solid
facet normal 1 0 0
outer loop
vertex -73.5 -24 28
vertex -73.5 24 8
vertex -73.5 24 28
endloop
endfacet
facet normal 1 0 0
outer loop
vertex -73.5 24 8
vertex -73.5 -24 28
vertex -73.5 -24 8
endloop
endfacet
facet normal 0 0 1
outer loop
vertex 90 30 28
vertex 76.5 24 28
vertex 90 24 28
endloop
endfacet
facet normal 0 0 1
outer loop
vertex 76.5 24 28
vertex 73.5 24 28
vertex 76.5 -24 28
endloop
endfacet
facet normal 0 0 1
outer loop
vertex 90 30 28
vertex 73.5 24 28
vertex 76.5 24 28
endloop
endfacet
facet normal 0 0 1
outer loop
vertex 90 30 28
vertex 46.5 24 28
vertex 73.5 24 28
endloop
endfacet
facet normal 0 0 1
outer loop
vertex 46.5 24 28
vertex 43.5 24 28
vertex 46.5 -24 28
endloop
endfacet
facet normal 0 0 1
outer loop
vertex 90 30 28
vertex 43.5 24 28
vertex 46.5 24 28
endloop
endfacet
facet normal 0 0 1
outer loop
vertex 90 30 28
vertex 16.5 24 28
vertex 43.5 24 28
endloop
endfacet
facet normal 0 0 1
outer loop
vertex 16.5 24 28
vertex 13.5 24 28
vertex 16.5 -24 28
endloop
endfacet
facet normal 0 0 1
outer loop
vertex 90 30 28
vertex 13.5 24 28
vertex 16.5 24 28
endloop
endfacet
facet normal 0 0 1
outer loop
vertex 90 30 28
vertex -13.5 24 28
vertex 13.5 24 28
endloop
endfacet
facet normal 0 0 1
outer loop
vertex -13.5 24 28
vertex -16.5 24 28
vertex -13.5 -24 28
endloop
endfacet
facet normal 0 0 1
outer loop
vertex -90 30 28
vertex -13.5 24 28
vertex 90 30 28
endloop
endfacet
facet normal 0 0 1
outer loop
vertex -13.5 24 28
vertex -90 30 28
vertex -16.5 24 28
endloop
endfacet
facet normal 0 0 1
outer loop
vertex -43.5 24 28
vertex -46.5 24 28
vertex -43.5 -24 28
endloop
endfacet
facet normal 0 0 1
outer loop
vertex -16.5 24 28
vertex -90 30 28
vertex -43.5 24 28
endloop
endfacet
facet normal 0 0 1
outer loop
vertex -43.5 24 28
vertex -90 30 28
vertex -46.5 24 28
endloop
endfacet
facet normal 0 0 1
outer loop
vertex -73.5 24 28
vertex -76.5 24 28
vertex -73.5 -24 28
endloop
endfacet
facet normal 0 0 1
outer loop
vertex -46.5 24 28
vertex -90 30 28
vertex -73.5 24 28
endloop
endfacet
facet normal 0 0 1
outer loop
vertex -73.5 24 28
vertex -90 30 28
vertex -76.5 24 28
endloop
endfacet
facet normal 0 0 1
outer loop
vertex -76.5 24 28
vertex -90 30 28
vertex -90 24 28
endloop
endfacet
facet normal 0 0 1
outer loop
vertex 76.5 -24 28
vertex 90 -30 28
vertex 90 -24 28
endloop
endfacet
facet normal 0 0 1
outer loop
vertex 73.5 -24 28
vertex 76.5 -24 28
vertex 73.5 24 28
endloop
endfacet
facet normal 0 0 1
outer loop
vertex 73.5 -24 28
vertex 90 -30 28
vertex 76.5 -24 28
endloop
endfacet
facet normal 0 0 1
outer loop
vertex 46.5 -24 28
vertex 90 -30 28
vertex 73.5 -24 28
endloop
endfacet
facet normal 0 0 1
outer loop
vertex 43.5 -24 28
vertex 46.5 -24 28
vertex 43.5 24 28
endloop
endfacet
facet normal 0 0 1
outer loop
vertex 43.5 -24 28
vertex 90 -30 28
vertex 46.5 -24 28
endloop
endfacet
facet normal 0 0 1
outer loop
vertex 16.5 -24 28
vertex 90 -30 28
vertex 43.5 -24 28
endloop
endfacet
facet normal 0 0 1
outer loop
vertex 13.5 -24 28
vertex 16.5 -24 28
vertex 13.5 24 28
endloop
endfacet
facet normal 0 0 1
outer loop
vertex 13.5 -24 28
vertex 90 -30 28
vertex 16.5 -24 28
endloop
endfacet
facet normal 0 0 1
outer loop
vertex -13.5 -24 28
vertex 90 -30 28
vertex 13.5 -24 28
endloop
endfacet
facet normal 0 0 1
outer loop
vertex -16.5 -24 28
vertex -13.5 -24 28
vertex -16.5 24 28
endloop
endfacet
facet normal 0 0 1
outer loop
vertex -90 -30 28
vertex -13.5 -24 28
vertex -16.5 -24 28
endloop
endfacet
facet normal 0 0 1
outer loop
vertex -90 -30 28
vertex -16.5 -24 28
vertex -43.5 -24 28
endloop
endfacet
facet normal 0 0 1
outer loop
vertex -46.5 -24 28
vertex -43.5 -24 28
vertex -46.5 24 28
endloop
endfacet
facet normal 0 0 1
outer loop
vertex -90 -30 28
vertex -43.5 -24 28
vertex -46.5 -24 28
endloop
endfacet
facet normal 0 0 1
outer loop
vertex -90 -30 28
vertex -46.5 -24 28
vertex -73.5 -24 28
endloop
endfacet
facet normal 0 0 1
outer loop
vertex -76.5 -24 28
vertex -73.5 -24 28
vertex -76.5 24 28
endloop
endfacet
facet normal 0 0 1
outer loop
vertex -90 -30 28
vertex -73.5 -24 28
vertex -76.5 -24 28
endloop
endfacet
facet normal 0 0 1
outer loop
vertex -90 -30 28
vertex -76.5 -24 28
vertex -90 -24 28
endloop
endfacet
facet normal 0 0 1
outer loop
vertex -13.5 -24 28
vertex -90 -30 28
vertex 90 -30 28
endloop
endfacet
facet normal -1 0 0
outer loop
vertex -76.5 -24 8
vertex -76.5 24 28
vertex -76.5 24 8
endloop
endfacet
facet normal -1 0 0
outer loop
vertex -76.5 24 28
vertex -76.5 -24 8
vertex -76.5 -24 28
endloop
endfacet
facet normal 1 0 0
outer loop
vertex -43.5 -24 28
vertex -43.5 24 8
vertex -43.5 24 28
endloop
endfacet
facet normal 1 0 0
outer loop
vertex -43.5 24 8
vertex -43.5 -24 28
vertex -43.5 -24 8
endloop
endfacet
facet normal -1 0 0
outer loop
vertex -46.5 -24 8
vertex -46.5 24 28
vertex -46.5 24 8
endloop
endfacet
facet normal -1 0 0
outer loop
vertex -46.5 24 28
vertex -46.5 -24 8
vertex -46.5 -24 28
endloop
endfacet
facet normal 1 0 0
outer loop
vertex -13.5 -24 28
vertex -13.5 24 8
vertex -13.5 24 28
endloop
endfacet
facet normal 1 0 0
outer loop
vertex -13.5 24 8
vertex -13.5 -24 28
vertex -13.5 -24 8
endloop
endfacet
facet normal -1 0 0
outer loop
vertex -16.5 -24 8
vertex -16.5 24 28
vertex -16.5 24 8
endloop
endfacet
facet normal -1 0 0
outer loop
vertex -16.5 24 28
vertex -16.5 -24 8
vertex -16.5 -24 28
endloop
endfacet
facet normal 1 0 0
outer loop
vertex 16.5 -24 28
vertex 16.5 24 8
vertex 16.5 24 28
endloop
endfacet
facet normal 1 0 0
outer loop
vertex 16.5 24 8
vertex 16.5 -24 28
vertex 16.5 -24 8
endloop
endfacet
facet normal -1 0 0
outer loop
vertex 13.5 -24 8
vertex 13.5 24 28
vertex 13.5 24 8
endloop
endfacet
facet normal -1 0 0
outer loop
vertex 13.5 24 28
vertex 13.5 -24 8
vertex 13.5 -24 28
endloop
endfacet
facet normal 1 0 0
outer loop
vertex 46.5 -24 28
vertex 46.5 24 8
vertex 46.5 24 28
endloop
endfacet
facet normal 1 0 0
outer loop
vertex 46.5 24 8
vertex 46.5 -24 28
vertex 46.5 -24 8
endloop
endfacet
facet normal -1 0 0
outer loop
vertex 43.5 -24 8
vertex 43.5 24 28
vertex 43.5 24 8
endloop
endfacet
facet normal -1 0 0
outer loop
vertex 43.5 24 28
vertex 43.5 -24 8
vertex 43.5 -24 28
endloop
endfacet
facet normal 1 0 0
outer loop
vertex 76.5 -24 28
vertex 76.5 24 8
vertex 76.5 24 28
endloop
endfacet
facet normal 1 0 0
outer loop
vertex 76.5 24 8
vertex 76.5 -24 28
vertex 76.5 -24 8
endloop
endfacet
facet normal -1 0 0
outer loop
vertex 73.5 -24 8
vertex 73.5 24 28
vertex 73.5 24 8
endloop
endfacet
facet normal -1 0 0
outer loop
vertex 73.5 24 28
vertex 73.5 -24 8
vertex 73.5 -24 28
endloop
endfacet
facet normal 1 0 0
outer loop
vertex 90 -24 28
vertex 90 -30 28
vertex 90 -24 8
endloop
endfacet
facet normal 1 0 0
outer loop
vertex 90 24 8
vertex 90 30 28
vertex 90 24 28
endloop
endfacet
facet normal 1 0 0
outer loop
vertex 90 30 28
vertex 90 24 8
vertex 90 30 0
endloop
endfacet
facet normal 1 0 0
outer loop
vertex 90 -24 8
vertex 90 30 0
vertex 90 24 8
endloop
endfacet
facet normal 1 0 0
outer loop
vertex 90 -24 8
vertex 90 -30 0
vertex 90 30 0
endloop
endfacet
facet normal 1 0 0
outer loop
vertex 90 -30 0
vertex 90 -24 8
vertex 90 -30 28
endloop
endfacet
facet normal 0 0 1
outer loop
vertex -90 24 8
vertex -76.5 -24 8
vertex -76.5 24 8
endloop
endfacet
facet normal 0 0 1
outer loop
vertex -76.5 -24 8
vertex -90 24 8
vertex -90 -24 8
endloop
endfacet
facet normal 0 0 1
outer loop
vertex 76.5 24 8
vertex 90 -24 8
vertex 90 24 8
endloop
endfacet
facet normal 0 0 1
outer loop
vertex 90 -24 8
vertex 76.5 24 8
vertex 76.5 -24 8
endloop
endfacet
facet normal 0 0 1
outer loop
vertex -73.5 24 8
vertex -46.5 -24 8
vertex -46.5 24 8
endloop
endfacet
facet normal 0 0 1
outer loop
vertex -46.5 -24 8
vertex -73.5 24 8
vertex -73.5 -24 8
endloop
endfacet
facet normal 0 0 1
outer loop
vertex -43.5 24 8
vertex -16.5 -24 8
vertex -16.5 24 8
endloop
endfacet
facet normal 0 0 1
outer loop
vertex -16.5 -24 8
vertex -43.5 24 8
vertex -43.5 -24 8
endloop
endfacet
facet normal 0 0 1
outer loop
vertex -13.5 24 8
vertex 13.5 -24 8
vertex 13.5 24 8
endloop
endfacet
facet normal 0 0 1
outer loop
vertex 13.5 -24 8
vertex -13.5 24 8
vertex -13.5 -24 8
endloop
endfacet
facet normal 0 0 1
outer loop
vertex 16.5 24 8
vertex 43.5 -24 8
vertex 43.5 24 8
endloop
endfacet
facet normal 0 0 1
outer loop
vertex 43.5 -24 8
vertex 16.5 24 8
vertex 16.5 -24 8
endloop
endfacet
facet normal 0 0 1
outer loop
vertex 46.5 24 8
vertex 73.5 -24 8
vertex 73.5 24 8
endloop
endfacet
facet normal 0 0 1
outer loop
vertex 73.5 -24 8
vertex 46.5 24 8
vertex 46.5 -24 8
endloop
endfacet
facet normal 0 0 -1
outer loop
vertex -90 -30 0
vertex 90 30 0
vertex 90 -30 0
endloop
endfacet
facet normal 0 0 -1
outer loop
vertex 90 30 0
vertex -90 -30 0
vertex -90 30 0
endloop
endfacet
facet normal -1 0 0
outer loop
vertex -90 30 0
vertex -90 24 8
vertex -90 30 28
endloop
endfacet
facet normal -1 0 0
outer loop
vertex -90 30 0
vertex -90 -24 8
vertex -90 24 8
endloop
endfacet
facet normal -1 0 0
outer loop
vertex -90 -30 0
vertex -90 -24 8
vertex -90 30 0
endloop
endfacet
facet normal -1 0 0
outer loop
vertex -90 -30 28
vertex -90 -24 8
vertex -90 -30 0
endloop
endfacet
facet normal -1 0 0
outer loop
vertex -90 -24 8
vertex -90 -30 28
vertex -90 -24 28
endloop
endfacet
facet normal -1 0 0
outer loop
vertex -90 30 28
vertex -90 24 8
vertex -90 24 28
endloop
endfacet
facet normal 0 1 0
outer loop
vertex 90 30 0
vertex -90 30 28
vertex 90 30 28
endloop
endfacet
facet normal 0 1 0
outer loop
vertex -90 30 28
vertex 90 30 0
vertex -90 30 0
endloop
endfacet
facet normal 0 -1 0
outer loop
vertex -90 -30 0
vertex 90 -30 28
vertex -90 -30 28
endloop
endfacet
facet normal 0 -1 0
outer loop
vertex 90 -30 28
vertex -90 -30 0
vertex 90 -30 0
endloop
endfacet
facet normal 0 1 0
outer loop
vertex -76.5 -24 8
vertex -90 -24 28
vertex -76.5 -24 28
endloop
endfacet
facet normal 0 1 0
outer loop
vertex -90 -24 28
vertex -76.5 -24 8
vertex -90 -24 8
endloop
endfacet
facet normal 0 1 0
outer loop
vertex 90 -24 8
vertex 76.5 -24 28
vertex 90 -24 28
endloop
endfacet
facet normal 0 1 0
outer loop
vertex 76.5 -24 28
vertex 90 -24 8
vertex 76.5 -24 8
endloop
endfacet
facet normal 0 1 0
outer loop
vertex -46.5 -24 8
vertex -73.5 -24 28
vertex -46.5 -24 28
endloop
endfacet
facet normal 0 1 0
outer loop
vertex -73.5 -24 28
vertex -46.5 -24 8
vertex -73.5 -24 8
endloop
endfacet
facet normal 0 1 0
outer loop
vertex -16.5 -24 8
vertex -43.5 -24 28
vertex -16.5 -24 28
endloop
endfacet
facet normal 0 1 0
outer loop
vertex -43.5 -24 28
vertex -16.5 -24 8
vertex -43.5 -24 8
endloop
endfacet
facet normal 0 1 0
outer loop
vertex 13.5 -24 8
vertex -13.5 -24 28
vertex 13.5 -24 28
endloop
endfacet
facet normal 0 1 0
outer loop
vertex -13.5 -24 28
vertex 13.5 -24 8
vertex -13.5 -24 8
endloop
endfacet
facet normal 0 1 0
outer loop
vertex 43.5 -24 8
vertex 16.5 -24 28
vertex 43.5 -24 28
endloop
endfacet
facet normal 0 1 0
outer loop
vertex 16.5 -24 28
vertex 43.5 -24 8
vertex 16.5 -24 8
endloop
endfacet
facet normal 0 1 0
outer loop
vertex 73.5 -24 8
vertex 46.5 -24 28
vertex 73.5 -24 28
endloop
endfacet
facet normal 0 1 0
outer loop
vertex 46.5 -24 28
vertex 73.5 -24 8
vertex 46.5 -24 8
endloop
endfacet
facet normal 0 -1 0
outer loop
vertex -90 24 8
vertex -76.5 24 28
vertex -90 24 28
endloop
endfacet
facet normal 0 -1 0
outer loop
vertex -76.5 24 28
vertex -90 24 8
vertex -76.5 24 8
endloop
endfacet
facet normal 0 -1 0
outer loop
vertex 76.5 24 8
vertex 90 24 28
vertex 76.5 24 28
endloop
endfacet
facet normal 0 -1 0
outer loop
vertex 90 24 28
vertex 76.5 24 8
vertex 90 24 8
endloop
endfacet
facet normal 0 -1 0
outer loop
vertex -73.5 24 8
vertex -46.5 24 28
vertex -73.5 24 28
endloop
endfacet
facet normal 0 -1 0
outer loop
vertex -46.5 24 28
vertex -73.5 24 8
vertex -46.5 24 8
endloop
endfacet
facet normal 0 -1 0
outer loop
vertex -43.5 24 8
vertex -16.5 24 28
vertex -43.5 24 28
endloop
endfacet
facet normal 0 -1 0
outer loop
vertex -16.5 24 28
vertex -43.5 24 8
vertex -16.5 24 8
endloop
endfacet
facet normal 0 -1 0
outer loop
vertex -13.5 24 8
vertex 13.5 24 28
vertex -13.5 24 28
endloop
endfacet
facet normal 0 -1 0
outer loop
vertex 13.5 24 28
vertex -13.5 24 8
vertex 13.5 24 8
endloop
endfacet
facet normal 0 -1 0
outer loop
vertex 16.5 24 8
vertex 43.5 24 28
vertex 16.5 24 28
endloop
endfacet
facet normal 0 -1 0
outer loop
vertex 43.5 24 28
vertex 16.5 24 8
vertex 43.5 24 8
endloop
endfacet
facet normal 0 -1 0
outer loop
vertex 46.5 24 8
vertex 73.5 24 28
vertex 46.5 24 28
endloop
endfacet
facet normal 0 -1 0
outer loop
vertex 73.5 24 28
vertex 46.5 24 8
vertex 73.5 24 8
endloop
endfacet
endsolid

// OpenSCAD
$fn = 32;

// ----------------------------------------------------------------------
// Rib frame 180 x 60 x 28
// 6 ribs at 30 mm pitch
// ----------------------------------------------------------------------

// --- parameters (mm) ---
frame = [180, 60, 8];  // base plate size (x, y, z)
rail_w = 6;            // side rail width
ribs = 6;              // number of ribs
rib_t = 3;             // rib thickness
rib_h = 20;            // rib height above the base plate
pitch = 30;            // pitch between rib centres

// --- derived feature positions (mm) ---
span = (ribs - 1) * pitch;          // = 150   distance between the outer ribs
origin_x = -span / 2;               // = -75   X of the first rib
rib_len = frame[1] - 2 * rail_w + 2;  // = 50   rib length, 1 mm into each rail
feature_centers = [
  [origin_x + 0 * pitch, 0],
  [origin_x + 1 * pitch, 0],
  [origin_x + 2 * pitch, 0],
  [origin_x + 3 * pitch, 0],
  [origin_x + 4 * pitch, 0],
  [origin_x + 5 * pitch, 0]
];   // rib centre line, drives the rib loop

// base plate, two side rails, then the ribs read straight off feature_centers
union() {
  translate([-frame[0] / 2, -frame[1] / 2, 0]) cube(frame);
  translate([-frame[0] / 2, -frame[1] / 2, 0]) cube([frame[0], rail_w, frame[2] + rib_h]);
  translate([-frame[0] / 2, frame[1] / 2 - rail_w, 0]) cube([frame[0], rail_w, frame[2] + rib_h]);
  for (centre = feature_centers)
    translate([centre[0] - rib_t / 2, centre[1] - rib_len / 2, frame[2] - 1])
      cube([rib_t, rib_len, rib_h + 1]);
}
